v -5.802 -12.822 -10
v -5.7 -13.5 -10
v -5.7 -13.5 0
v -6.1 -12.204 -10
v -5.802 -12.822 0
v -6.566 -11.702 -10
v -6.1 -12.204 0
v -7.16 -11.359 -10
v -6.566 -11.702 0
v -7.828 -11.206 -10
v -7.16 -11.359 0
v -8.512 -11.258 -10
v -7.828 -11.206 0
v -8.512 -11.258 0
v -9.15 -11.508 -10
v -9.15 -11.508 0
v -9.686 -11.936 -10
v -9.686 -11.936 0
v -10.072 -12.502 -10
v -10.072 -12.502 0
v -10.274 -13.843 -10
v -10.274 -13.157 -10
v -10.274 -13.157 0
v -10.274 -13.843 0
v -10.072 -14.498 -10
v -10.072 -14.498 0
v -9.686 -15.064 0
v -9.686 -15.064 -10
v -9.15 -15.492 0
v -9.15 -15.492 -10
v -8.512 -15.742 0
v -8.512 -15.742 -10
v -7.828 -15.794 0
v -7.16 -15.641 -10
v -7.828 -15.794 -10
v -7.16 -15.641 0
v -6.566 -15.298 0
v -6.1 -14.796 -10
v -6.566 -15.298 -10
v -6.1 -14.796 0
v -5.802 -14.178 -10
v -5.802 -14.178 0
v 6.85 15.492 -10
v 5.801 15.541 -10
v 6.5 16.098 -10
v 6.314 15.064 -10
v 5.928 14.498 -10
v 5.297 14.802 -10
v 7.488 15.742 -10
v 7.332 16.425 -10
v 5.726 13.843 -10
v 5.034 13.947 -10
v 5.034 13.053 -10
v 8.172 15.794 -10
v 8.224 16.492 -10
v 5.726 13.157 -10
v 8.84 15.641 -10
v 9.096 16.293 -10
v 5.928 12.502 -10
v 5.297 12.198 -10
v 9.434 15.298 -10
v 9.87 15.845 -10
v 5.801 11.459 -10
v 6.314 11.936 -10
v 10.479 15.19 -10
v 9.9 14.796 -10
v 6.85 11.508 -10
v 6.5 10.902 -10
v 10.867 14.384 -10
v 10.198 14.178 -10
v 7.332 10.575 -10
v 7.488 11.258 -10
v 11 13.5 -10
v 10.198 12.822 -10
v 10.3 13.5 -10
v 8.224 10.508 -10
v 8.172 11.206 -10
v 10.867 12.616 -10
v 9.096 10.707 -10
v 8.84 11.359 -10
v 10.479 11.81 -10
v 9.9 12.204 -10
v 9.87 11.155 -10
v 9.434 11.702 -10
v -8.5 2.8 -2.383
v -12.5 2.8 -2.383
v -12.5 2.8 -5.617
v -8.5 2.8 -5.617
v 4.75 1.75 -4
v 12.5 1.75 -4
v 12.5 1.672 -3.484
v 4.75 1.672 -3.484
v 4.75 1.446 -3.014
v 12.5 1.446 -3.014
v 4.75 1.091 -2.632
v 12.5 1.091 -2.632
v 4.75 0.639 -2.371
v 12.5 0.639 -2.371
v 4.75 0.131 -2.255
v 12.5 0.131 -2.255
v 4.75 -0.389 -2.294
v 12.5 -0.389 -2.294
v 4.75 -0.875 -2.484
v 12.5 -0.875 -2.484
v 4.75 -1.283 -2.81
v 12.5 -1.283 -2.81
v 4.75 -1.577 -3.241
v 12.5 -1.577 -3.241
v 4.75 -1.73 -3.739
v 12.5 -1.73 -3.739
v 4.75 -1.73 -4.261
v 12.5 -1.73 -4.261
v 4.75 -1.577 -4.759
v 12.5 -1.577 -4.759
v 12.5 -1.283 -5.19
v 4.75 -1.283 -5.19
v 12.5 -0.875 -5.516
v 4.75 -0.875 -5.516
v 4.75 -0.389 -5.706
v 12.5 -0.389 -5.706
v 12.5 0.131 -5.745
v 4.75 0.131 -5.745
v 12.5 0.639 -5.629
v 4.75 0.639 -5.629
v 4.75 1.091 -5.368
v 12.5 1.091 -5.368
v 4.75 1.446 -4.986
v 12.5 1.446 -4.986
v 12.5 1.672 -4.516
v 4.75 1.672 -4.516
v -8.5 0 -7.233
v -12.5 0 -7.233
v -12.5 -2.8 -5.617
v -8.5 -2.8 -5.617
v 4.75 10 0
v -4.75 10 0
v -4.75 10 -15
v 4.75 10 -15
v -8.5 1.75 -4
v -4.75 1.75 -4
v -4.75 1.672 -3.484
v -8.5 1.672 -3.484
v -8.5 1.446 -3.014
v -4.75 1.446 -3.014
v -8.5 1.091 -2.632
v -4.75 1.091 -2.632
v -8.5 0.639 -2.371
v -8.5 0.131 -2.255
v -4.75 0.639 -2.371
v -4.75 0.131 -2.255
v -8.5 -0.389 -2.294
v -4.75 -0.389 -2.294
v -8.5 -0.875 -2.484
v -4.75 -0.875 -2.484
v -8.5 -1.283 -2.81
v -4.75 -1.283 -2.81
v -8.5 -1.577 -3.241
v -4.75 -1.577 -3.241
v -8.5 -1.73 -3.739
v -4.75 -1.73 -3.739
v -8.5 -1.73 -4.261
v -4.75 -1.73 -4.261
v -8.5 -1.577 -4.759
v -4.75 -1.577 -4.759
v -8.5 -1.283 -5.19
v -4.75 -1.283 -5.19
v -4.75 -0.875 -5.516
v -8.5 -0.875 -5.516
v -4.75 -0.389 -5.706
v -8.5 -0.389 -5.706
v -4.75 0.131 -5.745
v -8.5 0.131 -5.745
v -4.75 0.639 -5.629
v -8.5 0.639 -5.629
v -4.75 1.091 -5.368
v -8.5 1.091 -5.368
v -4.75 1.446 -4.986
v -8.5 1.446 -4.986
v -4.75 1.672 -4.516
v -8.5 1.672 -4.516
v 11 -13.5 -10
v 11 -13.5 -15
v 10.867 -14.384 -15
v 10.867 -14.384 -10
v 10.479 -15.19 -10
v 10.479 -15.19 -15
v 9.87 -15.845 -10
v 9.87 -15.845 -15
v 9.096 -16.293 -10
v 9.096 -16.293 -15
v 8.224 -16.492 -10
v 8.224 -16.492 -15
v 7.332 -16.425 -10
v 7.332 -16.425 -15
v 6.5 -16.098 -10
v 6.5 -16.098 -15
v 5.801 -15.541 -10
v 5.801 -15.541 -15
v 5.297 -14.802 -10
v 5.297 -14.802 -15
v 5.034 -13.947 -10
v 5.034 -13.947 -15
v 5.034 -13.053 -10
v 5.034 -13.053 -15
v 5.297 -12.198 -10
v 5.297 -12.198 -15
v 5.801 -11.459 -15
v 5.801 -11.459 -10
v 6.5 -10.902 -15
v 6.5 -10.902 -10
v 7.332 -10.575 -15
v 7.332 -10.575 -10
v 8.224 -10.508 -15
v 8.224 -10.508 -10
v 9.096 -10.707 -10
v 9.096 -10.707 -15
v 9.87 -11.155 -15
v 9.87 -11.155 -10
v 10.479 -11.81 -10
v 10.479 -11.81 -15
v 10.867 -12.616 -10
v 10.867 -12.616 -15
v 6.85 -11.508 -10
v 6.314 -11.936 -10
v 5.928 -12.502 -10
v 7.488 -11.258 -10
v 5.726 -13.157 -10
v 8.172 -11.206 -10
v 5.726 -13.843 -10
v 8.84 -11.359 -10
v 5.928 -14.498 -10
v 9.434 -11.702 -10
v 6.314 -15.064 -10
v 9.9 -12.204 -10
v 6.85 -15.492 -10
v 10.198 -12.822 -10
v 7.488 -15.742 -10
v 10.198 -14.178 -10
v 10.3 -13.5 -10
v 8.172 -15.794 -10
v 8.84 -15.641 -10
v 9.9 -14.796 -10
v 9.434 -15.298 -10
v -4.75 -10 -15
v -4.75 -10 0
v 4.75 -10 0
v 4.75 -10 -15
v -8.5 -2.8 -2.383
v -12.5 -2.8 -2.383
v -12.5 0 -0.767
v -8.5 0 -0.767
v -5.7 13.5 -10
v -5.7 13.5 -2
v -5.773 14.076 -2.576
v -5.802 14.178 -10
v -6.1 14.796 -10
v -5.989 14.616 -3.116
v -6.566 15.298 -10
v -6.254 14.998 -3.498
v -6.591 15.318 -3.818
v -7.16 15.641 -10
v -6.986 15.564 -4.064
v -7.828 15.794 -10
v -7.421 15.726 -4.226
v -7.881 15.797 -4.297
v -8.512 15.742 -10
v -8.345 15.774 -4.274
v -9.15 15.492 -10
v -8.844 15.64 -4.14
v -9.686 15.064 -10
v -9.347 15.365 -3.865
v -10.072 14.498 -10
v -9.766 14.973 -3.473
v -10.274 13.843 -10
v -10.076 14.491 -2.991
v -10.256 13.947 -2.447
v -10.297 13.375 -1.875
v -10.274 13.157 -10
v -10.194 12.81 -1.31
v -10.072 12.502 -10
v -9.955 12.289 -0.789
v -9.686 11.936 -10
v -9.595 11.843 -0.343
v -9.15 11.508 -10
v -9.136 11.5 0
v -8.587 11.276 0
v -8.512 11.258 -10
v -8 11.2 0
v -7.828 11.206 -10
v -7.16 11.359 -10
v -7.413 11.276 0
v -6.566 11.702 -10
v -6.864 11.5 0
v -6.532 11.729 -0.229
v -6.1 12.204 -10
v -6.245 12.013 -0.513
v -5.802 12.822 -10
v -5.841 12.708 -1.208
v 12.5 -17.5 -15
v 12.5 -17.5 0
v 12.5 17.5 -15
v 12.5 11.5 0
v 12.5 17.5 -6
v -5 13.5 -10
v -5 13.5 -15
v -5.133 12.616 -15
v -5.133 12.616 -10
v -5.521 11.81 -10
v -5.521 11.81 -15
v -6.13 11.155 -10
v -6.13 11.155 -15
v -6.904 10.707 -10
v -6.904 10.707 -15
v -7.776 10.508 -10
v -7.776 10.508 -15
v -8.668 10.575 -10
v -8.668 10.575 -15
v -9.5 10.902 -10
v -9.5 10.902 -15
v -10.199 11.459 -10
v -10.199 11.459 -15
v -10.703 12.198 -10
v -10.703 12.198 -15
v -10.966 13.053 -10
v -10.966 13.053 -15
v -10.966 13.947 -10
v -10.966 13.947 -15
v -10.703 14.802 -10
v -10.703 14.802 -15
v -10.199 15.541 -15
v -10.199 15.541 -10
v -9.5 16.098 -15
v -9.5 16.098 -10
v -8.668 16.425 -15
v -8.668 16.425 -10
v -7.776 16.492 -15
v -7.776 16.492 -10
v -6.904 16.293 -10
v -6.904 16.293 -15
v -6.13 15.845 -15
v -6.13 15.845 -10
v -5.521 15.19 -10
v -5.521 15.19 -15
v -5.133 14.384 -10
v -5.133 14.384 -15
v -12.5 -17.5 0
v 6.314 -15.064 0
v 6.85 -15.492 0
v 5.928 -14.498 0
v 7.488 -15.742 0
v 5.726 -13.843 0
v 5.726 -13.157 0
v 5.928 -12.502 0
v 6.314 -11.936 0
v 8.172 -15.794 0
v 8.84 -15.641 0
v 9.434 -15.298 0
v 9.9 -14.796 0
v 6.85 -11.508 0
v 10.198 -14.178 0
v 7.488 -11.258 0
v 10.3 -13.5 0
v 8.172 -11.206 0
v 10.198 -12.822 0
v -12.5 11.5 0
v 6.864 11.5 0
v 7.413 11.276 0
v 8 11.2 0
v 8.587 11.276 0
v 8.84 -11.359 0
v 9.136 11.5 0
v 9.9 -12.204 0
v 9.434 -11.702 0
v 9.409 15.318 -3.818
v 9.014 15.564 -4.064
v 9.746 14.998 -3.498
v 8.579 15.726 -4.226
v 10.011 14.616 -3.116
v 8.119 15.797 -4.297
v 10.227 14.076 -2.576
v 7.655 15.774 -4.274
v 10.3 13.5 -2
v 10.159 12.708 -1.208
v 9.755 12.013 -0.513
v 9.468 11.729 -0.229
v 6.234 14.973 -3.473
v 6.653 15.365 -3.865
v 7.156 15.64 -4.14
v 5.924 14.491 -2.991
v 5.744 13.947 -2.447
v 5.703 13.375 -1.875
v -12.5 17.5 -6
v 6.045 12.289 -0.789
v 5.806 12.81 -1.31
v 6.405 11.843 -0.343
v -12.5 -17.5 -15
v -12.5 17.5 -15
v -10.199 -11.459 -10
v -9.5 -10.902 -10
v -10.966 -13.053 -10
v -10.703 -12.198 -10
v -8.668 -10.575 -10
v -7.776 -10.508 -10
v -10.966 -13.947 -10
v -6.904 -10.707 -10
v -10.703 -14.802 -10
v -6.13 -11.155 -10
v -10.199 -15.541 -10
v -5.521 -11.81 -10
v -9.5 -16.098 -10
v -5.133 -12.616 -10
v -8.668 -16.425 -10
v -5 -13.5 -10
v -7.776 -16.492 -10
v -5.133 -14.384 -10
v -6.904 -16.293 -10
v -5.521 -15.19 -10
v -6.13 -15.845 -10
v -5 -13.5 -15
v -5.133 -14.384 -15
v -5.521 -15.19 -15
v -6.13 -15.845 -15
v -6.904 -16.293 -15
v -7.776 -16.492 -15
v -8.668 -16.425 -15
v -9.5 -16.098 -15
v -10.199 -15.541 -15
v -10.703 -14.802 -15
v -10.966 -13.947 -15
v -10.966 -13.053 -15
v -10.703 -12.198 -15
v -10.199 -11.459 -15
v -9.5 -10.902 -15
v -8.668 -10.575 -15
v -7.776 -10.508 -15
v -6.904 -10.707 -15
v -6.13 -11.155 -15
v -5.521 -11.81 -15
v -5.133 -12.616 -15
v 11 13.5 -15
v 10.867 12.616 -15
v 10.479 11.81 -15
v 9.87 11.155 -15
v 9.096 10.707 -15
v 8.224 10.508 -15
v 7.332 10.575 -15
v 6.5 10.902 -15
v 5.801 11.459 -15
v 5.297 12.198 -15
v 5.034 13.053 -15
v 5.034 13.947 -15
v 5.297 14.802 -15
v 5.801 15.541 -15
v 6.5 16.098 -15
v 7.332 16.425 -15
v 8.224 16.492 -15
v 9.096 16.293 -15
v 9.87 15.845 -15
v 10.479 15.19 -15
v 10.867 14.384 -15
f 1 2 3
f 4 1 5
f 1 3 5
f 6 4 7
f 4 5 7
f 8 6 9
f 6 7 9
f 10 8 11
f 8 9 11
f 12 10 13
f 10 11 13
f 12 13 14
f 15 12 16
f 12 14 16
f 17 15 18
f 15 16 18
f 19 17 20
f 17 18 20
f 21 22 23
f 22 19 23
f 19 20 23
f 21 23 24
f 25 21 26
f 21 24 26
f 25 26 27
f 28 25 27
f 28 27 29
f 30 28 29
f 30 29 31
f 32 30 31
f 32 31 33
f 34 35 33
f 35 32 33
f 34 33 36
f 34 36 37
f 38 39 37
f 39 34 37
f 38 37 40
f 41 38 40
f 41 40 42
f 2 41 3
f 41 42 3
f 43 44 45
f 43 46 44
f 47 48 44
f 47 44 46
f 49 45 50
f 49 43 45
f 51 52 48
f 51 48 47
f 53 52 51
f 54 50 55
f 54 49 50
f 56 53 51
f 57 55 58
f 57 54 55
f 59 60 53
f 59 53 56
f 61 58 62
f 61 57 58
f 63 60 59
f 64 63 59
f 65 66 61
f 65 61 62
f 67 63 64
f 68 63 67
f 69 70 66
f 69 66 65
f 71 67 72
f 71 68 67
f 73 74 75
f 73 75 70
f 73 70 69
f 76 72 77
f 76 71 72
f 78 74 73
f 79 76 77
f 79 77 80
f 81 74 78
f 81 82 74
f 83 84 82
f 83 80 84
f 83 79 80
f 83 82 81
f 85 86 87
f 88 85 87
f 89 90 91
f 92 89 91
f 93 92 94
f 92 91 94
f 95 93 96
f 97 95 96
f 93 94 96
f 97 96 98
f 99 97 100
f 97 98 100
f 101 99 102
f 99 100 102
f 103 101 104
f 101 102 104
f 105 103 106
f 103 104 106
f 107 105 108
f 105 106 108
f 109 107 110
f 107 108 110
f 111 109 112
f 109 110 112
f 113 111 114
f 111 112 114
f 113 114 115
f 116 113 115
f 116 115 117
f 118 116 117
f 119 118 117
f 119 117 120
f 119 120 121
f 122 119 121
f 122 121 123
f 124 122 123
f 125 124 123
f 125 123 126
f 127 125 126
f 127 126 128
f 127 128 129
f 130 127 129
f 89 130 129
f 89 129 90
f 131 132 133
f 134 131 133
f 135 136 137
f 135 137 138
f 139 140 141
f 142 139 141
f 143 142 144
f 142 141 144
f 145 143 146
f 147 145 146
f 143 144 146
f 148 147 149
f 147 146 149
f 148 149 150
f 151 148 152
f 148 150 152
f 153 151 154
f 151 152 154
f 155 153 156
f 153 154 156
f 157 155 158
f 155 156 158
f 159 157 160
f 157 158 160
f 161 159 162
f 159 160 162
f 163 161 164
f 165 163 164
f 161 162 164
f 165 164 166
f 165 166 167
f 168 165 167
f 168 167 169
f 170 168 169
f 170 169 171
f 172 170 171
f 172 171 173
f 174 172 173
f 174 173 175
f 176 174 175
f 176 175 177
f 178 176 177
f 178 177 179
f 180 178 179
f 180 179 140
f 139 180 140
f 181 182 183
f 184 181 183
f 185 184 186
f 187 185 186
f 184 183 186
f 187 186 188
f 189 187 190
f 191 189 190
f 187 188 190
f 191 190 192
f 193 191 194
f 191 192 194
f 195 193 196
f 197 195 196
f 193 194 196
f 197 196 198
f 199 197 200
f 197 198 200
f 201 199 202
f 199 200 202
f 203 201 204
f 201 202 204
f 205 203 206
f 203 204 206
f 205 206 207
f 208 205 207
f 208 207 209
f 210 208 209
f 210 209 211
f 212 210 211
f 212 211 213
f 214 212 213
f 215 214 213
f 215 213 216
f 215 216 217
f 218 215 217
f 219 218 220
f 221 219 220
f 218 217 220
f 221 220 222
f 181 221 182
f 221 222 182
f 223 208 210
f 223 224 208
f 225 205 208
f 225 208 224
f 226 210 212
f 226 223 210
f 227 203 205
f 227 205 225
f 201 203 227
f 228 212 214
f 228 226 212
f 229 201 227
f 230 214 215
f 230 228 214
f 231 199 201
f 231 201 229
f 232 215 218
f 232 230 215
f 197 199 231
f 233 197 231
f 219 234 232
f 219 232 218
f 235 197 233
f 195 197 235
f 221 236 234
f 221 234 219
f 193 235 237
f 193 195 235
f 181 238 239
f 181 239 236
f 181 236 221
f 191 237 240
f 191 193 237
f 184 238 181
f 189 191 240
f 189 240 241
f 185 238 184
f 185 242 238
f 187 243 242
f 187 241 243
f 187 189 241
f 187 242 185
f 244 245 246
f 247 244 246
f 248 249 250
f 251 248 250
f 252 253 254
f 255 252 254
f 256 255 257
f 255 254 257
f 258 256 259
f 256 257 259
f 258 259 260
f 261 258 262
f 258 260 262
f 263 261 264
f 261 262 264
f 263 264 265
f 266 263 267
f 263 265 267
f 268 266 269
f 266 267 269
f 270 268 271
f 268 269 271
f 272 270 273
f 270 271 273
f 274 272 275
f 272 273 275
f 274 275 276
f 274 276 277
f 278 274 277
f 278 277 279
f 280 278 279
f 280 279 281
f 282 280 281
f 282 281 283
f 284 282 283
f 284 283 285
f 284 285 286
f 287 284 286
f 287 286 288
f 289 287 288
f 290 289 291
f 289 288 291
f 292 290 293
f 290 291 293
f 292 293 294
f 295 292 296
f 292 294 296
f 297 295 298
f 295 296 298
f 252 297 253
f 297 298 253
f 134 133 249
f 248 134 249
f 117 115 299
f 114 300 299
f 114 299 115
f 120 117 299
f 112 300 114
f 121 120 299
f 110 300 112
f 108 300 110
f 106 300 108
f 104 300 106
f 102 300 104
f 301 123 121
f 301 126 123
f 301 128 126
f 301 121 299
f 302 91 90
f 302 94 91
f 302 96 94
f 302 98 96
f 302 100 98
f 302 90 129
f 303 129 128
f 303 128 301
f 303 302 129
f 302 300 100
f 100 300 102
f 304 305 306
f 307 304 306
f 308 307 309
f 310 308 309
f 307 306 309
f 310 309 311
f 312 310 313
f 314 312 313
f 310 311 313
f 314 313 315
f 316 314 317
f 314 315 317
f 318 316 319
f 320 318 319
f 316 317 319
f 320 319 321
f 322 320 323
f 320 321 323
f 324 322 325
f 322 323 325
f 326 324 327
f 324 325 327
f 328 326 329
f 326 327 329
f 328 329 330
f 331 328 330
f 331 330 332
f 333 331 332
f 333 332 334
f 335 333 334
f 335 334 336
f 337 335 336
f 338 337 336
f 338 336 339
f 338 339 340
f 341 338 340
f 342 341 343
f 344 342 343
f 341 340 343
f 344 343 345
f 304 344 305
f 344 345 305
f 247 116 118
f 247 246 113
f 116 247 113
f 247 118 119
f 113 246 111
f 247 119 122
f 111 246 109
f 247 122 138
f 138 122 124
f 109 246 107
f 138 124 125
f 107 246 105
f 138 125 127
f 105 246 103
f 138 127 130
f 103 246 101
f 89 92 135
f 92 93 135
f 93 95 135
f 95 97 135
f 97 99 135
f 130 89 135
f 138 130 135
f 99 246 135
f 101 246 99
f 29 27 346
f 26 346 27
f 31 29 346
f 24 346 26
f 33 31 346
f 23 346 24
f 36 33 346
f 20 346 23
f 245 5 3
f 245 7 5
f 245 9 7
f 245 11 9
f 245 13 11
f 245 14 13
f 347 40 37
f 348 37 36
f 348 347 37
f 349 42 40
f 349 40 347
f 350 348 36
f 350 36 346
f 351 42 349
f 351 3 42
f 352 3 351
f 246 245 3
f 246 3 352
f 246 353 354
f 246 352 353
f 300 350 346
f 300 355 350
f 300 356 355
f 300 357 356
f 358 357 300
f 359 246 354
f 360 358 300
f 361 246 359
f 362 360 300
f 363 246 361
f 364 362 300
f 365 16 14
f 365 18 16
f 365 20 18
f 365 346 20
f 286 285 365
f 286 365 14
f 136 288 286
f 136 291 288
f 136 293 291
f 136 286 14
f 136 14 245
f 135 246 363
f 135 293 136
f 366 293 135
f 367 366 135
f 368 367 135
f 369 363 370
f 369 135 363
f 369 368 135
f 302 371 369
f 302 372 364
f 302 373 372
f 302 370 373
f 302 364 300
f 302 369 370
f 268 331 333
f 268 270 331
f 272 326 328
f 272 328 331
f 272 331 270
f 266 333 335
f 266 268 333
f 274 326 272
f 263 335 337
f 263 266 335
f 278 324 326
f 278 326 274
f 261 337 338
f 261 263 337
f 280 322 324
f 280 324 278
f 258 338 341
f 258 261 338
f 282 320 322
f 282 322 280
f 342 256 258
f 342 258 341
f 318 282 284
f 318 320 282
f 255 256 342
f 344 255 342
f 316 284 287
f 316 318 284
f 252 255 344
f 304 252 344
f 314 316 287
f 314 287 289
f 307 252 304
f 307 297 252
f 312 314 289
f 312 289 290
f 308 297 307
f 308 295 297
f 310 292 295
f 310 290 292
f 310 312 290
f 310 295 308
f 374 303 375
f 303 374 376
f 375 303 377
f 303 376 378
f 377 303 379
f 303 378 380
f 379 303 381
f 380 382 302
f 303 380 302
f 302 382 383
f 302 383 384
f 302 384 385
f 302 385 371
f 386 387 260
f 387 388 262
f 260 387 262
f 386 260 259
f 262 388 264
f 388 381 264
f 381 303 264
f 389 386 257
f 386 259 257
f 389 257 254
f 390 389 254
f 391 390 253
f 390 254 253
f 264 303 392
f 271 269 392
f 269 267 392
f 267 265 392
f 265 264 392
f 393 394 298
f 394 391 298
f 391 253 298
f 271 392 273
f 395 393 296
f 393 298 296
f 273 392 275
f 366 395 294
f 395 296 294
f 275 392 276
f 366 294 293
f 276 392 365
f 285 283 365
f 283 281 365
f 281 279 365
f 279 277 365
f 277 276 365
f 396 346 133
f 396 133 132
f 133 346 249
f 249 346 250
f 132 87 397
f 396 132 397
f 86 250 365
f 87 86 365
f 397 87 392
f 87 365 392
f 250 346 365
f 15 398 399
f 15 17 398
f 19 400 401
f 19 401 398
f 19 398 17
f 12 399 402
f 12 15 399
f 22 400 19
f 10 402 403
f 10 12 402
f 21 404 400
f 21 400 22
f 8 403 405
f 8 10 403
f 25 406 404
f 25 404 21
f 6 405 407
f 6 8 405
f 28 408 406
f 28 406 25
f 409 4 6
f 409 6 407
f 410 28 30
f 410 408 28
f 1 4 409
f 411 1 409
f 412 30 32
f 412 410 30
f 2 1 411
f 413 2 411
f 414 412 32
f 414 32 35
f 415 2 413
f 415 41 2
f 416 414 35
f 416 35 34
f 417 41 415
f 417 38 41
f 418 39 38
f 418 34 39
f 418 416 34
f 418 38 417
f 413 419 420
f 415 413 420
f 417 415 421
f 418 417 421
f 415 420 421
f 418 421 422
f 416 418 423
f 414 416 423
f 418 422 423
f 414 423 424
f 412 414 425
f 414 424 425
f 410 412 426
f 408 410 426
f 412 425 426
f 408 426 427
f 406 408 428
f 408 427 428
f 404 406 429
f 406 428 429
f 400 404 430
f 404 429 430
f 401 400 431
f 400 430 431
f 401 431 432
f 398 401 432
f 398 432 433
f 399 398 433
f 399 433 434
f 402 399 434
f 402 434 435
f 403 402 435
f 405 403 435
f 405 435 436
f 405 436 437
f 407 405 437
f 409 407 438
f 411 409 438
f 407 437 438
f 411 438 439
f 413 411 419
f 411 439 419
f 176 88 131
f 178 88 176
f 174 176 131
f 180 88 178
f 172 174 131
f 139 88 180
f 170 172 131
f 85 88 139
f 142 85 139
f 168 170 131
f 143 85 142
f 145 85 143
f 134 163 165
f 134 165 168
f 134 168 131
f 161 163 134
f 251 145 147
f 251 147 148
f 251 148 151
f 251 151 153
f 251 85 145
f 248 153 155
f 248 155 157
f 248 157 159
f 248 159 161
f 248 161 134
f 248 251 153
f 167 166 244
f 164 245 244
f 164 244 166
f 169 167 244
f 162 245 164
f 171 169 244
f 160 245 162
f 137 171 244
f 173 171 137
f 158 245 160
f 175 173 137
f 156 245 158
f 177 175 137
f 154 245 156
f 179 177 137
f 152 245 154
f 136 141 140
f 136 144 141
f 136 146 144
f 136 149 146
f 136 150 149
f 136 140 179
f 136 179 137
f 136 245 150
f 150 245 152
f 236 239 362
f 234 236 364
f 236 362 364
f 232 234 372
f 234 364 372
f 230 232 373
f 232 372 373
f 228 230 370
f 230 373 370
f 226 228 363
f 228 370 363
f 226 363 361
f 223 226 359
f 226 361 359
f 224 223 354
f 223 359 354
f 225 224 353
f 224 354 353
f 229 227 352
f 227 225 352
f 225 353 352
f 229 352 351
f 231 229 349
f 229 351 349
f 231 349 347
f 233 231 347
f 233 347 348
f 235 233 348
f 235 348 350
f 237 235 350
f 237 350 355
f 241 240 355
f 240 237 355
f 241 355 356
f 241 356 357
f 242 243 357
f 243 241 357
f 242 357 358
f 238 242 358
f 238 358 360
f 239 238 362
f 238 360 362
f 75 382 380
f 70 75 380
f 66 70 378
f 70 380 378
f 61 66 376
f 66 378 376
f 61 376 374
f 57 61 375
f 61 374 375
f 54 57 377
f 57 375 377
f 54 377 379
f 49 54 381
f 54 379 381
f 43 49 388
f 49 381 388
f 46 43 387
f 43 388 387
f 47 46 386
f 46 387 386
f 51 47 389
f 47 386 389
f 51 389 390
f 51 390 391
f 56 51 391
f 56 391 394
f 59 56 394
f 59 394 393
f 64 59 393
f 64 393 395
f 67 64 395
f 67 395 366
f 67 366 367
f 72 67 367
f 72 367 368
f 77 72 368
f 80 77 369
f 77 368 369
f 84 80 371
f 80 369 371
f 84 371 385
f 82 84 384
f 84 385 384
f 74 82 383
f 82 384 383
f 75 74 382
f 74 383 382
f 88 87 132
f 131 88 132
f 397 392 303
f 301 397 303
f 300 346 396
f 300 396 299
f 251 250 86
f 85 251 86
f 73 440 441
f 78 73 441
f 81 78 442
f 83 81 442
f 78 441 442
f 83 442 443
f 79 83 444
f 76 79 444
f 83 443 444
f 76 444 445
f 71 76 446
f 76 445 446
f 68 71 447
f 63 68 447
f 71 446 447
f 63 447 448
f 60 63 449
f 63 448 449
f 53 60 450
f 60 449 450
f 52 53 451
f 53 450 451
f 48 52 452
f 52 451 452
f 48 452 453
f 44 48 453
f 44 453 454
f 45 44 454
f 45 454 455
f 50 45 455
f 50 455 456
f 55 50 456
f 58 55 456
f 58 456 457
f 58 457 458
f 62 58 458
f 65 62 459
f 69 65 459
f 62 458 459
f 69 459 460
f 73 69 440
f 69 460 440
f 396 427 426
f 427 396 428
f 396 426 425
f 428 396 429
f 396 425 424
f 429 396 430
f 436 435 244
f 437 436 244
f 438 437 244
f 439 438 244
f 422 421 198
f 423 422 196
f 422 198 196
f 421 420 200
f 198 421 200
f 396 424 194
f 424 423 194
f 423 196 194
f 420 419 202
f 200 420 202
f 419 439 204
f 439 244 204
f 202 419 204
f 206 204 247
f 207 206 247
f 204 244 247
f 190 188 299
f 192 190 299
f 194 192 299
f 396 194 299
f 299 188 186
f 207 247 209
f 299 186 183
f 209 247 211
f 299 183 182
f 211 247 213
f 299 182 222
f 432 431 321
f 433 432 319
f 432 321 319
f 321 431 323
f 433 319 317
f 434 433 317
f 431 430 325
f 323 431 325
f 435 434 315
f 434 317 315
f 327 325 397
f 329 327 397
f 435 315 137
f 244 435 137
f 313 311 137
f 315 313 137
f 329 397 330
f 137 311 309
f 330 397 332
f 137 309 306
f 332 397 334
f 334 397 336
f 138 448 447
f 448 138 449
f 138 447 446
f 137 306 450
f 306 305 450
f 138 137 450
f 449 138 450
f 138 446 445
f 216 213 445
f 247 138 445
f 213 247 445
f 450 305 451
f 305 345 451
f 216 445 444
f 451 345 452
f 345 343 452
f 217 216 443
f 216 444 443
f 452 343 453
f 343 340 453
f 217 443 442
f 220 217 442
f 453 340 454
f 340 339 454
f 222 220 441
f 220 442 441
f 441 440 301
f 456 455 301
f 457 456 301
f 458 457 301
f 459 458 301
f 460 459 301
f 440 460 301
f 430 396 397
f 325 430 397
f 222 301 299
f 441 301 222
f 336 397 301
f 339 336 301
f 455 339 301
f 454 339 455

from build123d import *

# Parameters (mm, degrees)
F0_W         = 25
F0_H         = 35
F1_DEPTH     = 15
F2_R         = 1.75
F3_DEPTH     = 25
F4_W         = 9.5
F4_H         = 20
F5_DEPTH     = 15
F6_R         = 1.75
F7_DEPTH     = 4
F8_R         = 2.3
F9_DEPTH     = 15
F10_R        = 3
F10_R_2      = 2.3
F11_DEPTH    = 5
F12_T1_DEPTH = 55.8601958556


# Not quite as in the source:
# - a fillet or chamfer that OpenCascade refuses, or shapes differently, is made with other operations: its cross-section is extruded or revolved along the edge and cut away or added


with BuildPart() as f1:
    # F0 (on Top) → F1 (new body)
    with BuildSketch(Plane.XY):
        Rectangle(F0_W, F0_H)
    extrude(amount=-F1_DEPTH)

    # F2 (on face) → F3 (cut)
    with BuildSketch(Plane.YZ.offset(12.5)):
        with Locations((0, -4)):
            Circle(F2_R)
    extrude(amount=-F3_DEPTH, mode=Mode.SUBTRACT)

    # F4 (on face) → F5 (cut)
    with BuildSketch(Plane.XY):
        Rectangle(F4_W, F4_H)
    extrude(amount=-F5_DEPTH, mode=Mode.SUBTRACT)

    # F6 (on face) → F7 (cut)
    with BuildSketch(Plane(origin=(-12.5, 0, 0), x_dir=(0, -1, 0), z_dir=(-1, 0, 0))):
        Polygon((-2.8, -2.3834192463), (-2.8, -5.6165807537), (0, -7.2331615075), (2.8, -5.6165807537), (2.8, -2.3834192463), (0, -0.7668384925), align=None)
        with Locations((0, -4)):
            Circle(F6_R, mode=Mode.SUBTRACT)
    extrude(amount=-F7_DEPTH, mode=Mode.SUBTRACT)

    # F8 (on face) → F9 (cut)
    with BuildSketch(Plane.XY):
        with Locations((-8, 13.5)):
            Circle(F8_R)
        with Locations((8, 13.5)):
            Circle(F8_R)
        with Locations((8, -13.5)):
            Circle(F8_R)
        with Locations((-8, -13.5)):
            Circle(F8_R)
    extrude(amount=-F9_DEPTH, mode=Mode.SUBTRACT)

    # F10 (on face) → F11 (cut)
    with BuildSketch(Plane(origin=(0, 0, -15), x_dir=(1, 0, 0), z_dir=(0, 0, -1))):
        with Locations((-8, 13.5)):
            Circle(F10_R)
        with Locations((-8, 13.5)):
            Circle(F10_R_2, mode=Mode.SUBTRACT)
        with Locations((8, 13.5)):
            Circle(F10_R)
        with Locations((8, 13.5)):
            Circle(F10_R_2, mode=Mode.SUBTRACT)
        with Locations((8, -13.5)):
            Circle(F10_R)
        with Locations((8, -13.5)):
            Circle(F10_R_2, mode=Mode.SUBTRACT)
        with Locations((-8, -13.5)):
            Circle(F10_R)
        with Locations((-8, -13.5)):
            Circle(F10_R_2, mode=Mode.SUBTRACT)
    extrude(amount=-F11_DEPTH, mode=Mode.SUBTRACT)

    # F12: chamfer of 6 on 1 edges, made by hand

    # F12_s2 → F12_t1 (cut)
    with BuildSketch(Plane.YZ.offset(-27.9300979278)):
        Polygon((17.5, -6), (11.5, 0), (17.5, 0), align=None)
    extrude(amount=F12_T1_DEPTH, mode=Mode.SUBTRACT)


solid = f1.part
